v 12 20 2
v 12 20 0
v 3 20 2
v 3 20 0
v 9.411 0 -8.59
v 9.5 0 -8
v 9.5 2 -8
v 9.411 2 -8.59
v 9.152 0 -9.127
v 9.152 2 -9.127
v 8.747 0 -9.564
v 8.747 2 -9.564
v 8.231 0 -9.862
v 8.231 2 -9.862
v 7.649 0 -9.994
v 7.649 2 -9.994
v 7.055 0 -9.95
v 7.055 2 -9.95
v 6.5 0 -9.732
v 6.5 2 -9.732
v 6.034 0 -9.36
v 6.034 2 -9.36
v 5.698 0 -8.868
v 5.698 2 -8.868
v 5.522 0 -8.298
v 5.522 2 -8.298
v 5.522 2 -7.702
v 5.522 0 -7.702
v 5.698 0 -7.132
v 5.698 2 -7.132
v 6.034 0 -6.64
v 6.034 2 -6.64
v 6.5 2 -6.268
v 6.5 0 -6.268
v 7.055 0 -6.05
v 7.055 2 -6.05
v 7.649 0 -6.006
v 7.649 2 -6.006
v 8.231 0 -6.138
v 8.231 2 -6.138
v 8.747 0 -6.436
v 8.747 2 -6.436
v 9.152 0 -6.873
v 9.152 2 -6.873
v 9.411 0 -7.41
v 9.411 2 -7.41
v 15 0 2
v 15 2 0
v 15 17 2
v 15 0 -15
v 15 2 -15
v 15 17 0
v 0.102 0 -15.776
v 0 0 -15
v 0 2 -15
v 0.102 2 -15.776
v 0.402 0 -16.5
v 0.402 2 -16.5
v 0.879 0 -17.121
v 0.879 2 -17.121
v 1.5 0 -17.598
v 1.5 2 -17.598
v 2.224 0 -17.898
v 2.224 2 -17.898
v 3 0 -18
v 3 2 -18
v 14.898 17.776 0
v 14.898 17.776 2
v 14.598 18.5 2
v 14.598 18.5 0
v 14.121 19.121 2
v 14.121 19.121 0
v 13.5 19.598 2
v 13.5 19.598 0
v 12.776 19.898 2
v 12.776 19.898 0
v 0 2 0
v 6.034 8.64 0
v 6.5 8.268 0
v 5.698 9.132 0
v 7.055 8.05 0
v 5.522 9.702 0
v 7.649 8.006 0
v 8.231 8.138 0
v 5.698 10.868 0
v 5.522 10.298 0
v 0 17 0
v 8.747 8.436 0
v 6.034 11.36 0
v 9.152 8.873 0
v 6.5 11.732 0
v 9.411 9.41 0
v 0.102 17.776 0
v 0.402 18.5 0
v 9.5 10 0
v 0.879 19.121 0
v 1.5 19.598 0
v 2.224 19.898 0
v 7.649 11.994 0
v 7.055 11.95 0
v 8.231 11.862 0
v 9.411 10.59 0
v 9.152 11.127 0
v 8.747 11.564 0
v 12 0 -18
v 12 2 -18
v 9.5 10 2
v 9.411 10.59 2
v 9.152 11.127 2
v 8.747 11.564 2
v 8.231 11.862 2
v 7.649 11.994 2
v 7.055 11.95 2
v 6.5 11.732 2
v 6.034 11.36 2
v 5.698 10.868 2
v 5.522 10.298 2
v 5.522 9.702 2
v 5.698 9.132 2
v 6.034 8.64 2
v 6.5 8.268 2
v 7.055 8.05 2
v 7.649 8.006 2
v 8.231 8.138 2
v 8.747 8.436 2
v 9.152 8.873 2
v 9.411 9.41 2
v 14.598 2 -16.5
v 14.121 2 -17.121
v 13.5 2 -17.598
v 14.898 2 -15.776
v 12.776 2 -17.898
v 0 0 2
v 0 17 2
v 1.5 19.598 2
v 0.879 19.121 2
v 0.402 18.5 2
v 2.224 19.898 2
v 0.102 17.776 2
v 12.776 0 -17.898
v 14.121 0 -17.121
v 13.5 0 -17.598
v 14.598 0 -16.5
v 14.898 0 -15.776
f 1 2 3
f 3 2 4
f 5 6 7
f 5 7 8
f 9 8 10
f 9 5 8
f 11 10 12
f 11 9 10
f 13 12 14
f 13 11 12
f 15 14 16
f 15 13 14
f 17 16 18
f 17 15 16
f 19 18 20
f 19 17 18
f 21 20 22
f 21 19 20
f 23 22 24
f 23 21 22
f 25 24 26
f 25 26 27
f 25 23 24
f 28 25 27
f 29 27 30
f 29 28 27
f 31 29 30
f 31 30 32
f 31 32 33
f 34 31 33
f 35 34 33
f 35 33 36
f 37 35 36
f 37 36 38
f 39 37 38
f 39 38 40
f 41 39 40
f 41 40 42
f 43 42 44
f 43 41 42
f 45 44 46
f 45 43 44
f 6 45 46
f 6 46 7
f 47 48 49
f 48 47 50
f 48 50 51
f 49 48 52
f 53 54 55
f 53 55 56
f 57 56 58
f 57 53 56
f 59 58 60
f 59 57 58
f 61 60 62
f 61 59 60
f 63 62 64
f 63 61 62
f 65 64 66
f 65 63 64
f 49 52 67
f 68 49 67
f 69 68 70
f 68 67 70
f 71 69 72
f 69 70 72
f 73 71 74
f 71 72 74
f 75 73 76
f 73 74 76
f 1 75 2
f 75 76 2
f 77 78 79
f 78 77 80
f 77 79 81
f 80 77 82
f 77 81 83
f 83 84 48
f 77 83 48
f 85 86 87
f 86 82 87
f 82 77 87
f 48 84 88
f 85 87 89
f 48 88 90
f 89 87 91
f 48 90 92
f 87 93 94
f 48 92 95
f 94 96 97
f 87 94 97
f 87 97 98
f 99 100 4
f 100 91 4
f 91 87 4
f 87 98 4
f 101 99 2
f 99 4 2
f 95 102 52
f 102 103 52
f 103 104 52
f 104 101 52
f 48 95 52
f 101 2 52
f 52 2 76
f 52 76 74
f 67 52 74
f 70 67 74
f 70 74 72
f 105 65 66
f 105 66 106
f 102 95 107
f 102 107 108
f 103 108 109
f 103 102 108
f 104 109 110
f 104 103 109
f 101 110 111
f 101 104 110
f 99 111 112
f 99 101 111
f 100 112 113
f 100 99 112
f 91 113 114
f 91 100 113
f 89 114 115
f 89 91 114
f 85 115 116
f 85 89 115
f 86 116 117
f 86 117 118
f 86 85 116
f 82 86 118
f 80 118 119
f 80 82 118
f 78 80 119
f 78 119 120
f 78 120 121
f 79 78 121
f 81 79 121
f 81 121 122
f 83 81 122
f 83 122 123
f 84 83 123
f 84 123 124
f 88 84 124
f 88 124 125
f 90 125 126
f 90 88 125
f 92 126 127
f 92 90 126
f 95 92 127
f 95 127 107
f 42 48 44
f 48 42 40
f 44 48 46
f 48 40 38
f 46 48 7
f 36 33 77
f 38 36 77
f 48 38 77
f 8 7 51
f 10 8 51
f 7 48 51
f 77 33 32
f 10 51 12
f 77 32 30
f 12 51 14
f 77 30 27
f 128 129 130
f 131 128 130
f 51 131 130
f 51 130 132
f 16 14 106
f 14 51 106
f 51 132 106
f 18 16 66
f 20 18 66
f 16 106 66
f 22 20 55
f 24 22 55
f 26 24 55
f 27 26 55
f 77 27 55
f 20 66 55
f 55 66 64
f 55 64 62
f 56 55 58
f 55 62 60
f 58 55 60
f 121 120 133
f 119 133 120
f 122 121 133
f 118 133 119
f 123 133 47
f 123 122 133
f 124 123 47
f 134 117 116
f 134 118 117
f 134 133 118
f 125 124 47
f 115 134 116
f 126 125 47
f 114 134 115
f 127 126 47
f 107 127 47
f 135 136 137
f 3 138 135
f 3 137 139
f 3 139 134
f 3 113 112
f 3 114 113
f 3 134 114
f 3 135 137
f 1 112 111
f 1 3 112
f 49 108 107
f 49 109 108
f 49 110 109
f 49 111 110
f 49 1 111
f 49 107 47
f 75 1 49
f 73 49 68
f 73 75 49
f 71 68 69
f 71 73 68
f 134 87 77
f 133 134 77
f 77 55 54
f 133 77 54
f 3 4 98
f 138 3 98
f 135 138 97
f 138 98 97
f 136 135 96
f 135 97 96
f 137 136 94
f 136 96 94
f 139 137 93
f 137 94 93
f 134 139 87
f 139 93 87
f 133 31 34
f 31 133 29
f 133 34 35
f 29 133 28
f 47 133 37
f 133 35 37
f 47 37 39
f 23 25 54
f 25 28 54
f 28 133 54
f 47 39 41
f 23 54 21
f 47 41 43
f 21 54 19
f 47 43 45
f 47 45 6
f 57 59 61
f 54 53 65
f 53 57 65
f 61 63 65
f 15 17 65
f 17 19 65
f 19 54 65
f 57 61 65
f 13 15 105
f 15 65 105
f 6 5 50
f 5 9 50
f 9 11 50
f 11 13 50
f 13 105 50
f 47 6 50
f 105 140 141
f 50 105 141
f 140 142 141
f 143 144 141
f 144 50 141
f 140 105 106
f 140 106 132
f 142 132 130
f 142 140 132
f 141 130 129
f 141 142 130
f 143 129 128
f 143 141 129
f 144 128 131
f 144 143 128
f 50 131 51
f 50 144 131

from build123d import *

# Parameters (mm, degrees)
SKETCH1_R           = 2
BOSS_EXTRUDE1_DEPTH = 2
SKETCH2_R           = 2
SKETCH2_W           = 15
SKETCH2_H           = 2
BOSS_EXTRUDE2_DEPTH = 2


with BuildPart() as part:
    # Sketch1 → Boss-Extrude1 (new body)
    with BuildSketch(Plane(origin=(0, 0, 0), x_dir=(1, 0, 0), z_dir=(0, 1, 0))):
        with BuildLine():
            Line((0, 0), (0, 15))
            ThreePointArc((0, 15), (0.878679656, 17.121320344), (3, 18))
            Line((3, 18), (12, 18))
            ThreePointArc((12, 18), (14.121320344, 17.121320344), (15, 15))
            Line((15, 15), (15, 0))
            Line((15, 0), (0, 0))
        make_face()
        with Locations((7.5, 8)):
            Circle(SKETCH1_R, mode=Mode.SUBTRACT)
    extrude(amount=BOSS_EXTRUDE1_DEPTH)

    # Sketch2 → Boss-Extrude2 (add)
    with BuildSketch(Plane.XY):
        with BuildLine():
            Line((0, 17), (0, 2))
            Line((0, 2), (15, 2))
            Line((15, 2), (15, 17))
            ThreePointArc((15, 17), (14.121320344, 19.121320344), (12, 20))
            Line((12, 20), (3, 20))
            ThreePointArc((3, 20), (0.878679656, 19.121320344), (0, 17))
        make_face()
        with Locations((7.5, 10)):
            Circle(SKETCH2_R, mode=Mode.SUBTRACT)
        with Locations((7.5, 1)):
            Rectangle(SKETCH2_W, SKETCH2_H)
    extrude(amount=BOSS_EXTRUDE2_DEPTH)


solid = part.part
